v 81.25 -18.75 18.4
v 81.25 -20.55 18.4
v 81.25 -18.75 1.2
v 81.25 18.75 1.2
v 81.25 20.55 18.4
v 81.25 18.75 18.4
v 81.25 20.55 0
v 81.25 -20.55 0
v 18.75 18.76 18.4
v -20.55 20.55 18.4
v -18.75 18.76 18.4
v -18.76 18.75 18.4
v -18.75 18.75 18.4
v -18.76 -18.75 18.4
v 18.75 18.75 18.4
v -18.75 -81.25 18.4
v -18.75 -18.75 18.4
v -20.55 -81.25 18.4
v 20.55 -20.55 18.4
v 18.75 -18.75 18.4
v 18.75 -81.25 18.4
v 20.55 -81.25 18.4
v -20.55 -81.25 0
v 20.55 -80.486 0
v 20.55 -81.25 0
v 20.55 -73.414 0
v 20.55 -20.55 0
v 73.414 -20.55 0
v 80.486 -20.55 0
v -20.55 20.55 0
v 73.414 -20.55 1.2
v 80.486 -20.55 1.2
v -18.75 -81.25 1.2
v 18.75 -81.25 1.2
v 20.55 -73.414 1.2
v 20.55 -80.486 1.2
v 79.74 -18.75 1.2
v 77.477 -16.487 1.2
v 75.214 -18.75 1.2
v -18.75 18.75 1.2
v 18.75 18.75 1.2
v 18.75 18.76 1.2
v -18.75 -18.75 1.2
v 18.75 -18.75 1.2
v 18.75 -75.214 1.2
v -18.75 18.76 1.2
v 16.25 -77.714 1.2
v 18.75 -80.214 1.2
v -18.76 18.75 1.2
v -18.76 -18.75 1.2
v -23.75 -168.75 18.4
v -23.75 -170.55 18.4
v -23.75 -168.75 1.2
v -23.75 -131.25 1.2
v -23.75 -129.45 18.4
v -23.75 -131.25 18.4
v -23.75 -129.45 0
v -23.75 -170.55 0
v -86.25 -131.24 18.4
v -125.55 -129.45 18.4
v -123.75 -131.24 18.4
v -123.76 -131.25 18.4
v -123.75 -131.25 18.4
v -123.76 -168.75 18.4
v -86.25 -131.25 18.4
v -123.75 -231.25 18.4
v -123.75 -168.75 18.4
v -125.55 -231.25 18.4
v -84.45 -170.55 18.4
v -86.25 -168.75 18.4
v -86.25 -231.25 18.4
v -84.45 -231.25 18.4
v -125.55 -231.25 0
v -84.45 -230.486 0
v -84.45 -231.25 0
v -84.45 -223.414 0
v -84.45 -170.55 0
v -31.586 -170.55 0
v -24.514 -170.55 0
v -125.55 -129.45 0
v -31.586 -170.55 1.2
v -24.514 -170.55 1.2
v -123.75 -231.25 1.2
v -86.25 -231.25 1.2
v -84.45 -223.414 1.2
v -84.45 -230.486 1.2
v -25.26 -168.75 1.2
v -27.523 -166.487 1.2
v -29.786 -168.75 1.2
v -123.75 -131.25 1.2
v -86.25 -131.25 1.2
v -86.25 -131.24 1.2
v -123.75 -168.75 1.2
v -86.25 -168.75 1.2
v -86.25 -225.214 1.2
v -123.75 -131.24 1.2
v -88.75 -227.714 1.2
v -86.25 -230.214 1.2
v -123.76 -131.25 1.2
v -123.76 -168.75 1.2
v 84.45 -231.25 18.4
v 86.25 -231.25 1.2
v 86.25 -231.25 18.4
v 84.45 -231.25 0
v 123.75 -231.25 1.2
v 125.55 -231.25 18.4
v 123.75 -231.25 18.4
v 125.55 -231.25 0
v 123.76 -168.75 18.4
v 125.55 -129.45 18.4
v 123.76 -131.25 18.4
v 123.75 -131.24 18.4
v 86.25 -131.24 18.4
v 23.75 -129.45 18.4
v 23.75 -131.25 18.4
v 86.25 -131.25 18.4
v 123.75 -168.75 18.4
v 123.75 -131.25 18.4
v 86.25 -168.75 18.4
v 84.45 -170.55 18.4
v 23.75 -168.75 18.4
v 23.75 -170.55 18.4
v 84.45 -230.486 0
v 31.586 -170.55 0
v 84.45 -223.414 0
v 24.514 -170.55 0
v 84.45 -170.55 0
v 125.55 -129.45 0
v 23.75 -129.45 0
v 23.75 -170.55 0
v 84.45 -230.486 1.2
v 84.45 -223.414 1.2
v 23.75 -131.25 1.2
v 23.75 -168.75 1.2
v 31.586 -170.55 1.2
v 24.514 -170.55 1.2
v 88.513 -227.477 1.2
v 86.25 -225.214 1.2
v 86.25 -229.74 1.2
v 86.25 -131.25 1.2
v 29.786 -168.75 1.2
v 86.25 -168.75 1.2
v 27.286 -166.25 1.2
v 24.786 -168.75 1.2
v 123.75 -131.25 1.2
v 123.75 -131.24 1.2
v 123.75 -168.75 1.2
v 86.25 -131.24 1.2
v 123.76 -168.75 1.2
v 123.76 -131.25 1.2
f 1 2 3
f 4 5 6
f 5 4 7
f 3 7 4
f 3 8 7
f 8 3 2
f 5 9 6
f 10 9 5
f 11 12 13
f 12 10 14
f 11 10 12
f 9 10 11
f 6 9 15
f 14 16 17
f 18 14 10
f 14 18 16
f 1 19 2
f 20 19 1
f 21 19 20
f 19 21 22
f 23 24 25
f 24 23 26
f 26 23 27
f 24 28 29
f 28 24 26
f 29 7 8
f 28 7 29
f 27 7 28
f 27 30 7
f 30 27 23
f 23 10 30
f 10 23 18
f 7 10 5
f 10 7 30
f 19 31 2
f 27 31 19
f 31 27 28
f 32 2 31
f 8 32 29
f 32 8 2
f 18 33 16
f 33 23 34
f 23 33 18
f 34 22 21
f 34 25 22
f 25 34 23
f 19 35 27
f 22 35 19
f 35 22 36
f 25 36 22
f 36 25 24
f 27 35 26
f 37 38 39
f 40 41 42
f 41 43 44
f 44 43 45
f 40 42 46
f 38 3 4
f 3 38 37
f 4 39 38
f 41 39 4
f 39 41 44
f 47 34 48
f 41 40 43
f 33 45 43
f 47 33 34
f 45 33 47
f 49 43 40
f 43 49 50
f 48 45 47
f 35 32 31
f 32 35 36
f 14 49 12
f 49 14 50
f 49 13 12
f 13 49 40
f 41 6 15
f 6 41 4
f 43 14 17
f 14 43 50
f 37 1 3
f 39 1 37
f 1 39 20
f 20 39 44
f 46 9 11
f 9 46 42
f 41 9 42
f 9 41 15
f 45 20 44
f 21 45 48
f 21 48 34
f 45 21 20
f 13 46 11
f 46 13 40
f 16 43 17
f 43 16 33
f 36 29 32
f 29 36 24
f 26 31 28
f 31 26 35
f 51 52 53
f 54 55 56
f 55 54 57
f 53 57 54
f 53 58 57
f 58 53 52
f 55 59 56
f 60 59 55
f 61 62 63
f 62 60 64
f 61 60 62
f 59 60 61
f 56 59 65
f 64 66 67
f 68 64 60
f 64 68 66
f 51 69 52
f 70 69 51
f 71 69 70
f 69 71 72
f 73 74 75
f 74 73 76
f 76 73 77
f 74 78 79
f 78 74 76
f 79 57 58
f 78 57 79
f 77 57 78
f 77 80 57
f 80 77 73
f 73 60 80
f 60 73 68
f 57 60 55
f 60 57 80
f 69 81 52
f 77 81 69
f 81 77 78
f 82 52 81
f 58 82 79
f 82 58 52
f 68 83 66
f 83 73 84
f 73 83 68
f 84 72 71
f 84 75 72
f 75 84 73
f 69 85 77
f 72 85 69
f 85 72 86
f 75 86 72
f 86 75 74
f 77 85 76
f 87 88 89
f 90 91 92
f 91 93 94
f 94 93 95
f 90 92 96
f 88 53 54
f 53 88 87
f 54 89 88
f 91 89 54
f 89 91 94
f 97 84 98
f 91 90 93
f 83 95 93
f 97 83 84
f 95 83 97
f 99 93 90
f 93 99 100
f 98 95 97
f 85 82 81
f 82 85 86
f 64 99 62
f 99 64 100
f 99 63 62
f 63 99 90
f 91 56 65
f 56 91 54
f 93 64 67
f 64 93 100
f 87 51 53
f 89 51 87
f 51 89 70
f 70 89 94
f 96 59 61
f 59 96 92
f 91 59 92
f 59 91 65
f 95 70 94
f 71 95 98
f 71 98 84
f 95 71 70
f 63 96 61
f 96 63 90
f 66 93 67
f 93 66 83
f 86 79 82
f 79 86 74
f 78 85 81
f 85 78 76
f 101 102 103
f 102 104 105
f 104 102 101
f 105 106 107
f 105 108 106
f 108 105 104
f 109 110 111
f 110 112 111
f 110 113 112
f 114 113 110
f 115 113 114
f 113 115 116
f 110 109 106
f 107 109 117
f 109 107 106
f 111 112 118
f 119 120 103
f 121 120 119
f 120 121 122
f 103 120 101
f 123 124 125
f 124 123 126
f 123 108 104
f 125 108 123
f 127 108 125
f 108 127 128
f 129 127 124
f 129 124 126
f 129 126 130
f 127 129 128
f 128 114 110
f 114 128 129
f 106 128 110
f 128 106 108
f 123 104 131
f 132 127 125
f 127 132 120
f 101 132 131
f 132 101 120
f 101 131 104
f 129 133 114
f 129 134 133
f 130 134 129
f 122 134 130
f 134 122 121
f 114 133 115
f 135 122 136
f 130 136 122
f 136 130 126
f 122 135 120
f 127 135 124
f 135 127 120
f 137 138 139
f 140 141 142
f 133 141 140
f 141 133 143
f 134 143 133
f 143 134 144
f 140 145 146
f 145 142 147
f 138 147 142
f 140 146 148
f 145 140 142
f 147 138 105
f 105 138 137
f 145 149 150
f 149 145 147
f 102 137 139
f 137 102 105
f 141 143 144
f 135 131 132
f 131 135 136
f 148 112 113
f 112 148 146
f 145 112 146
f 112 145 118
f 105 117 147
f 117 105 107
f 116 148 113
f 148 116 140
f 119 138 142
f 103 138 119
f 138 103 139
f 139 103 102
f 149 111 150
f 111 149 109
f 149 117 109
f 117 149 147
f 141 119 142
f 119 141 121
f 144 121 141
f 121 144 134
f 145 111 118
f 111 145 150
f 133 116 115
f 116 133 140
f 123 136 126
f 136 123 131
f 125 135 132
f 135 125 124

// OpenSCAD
// -*- mode: SCAD ; c-file-style: "ellemtel" ; coding: utf-8 -*-
//
// NN
//
// © 2018–2019 Roland Sieker <ospalh@gmail.com>
// Licence: CC-BY-SA 4.0

/* [Global] */

// … to preview. You will get all parts as separate STLs when you click “Create Thing”.
part = "s"; // [s: Set, l: Lattenecke, m: linke Lattenecke mit Schlaufe, n: rechte Lattenecke mit Schlaufe, st: Stack]

// Set this to “render” and click on “Create Thing” when done with the setup.
preview = 1; // [0:render, 1:preview]

/* [Sizes] */

// Höhe der Latte
size_x = 37.5;  // [1:0.1:40]

// Tiefe der Latte
size_y = 17.2;  // [1:0.1:40]

// Länge der Latte im Halter
laenge = 100;  // [50:01:150]

// Abstand Latte-Haken
hly = 30;  // [1:0.1:40]

/* [Hidden] */


pw = 5;
pg = 10;
pr1 = pg/2;
pr2 = 2;

exl=hly-2*pw-pg;

// Done with the customizer

// *******************************************************
// Extra parameters. These can be changed reasonably safely.


w = 1.8;  // Wall width
p = 1.2;  // Bottom, top plate hight
c = 0.4;  // Clearance
angle = 60; // Overhangs much below 60° are a problem for me

// *******************************************************
// Some shortcuts. These shouldn’t be changed


module kmirror(maxis=[1, 0, 0])
{
   // Keep *and* mirror an object. Standard is left and right mirroring.
   children();
   mirror(maxis)
   {
      children();
   }
}

tau = 2 * PI;  // π is still wrong. τ = circumference / r

xy_factor = 1/tan(angle);
// To get from a hight to a horizontal width inclined correctly
z_factor = tan(angle);  // The other way around


some_distance = 150;
ms = 0.01;  // Muggeseggele.

// fn for differently sized objects and fs, fa; all for preview or rendering.
pna = 40;
pnb = 15;
pa = 5;
ps = 1;
rna = 180;
rnb = 30;
ra = 2;
rs = 0.25;
function na() = (preview) ? pna : rna;
function nb() = (preview) ? pnb : rnb;
$fs = (preview) ? ps : rs;
$fa = (preview) ? pa : ra;

// *******************************************************
// End setup



// *******************************************************
// Generate the parts

print_part();


if ("s" == part)
{
   preview_parts();
}

if ("st" == part)
{
   // Use "st" during development
   stack_parts();
}

module print_part()
{
   if ("l" == part)
   {
      lattenecke();
   }
   if ("m" == part)
   {
      lattenecke_links();
   }
   if ("n" == part)
   {
      lattenecke_rechts();
   }
}

module preview_parts()
{
   lattenecke();
   translate([-0.7*some_distance, -some_distance, 0])
   {
      lattenecke_links();
   }
   translate([0.7*some_distance, -some_distance, 0])
   {
      lattenecke_rechts();
   }
}

module stack_parts()
{
   // intersection()
   {
      color("yellow")
      {
         lattenecke_links();
      }
      // translate([0,0,30])
      rotate([0,180,0])
      {
         color("red")
         {
            lattenecke_rechts();
         }
      }
   }
}

// *******************************************************
// Code for the parts themselves


module lattenecke()
{
   difference()
   {
      union()
      {

         lattending_m();
         rotate(-90)
            lattending_m();
      }
      lattending_l();
         rotate(-90)
            lattending_l();
   }
   translate([-pw/2+size_x/2,-laenge+size_x/2+pw/sqrt(2),0])
      rotate(-45)
      cube([pw,(sqrt(2)*(laenge-size_x))-w,p]);

}

module lattenecke_links()
{
   lattenecke();
}

module lattenecke_rechts()
{
   rotate(270)
      lattenecke();
}


module lattending_m()
{
   translate([-size_x/2-w, -size_x/2-w,0])
   {
      cube([laenge+w, size_x+2*w, size_y+p]);
   }
}
module lattending_l()
{
   translate([-size_x/2-ms, -size_x/2,p])
   {
      cube([laenge+2*ms, size_x, size_y+ms]);
   }
}
